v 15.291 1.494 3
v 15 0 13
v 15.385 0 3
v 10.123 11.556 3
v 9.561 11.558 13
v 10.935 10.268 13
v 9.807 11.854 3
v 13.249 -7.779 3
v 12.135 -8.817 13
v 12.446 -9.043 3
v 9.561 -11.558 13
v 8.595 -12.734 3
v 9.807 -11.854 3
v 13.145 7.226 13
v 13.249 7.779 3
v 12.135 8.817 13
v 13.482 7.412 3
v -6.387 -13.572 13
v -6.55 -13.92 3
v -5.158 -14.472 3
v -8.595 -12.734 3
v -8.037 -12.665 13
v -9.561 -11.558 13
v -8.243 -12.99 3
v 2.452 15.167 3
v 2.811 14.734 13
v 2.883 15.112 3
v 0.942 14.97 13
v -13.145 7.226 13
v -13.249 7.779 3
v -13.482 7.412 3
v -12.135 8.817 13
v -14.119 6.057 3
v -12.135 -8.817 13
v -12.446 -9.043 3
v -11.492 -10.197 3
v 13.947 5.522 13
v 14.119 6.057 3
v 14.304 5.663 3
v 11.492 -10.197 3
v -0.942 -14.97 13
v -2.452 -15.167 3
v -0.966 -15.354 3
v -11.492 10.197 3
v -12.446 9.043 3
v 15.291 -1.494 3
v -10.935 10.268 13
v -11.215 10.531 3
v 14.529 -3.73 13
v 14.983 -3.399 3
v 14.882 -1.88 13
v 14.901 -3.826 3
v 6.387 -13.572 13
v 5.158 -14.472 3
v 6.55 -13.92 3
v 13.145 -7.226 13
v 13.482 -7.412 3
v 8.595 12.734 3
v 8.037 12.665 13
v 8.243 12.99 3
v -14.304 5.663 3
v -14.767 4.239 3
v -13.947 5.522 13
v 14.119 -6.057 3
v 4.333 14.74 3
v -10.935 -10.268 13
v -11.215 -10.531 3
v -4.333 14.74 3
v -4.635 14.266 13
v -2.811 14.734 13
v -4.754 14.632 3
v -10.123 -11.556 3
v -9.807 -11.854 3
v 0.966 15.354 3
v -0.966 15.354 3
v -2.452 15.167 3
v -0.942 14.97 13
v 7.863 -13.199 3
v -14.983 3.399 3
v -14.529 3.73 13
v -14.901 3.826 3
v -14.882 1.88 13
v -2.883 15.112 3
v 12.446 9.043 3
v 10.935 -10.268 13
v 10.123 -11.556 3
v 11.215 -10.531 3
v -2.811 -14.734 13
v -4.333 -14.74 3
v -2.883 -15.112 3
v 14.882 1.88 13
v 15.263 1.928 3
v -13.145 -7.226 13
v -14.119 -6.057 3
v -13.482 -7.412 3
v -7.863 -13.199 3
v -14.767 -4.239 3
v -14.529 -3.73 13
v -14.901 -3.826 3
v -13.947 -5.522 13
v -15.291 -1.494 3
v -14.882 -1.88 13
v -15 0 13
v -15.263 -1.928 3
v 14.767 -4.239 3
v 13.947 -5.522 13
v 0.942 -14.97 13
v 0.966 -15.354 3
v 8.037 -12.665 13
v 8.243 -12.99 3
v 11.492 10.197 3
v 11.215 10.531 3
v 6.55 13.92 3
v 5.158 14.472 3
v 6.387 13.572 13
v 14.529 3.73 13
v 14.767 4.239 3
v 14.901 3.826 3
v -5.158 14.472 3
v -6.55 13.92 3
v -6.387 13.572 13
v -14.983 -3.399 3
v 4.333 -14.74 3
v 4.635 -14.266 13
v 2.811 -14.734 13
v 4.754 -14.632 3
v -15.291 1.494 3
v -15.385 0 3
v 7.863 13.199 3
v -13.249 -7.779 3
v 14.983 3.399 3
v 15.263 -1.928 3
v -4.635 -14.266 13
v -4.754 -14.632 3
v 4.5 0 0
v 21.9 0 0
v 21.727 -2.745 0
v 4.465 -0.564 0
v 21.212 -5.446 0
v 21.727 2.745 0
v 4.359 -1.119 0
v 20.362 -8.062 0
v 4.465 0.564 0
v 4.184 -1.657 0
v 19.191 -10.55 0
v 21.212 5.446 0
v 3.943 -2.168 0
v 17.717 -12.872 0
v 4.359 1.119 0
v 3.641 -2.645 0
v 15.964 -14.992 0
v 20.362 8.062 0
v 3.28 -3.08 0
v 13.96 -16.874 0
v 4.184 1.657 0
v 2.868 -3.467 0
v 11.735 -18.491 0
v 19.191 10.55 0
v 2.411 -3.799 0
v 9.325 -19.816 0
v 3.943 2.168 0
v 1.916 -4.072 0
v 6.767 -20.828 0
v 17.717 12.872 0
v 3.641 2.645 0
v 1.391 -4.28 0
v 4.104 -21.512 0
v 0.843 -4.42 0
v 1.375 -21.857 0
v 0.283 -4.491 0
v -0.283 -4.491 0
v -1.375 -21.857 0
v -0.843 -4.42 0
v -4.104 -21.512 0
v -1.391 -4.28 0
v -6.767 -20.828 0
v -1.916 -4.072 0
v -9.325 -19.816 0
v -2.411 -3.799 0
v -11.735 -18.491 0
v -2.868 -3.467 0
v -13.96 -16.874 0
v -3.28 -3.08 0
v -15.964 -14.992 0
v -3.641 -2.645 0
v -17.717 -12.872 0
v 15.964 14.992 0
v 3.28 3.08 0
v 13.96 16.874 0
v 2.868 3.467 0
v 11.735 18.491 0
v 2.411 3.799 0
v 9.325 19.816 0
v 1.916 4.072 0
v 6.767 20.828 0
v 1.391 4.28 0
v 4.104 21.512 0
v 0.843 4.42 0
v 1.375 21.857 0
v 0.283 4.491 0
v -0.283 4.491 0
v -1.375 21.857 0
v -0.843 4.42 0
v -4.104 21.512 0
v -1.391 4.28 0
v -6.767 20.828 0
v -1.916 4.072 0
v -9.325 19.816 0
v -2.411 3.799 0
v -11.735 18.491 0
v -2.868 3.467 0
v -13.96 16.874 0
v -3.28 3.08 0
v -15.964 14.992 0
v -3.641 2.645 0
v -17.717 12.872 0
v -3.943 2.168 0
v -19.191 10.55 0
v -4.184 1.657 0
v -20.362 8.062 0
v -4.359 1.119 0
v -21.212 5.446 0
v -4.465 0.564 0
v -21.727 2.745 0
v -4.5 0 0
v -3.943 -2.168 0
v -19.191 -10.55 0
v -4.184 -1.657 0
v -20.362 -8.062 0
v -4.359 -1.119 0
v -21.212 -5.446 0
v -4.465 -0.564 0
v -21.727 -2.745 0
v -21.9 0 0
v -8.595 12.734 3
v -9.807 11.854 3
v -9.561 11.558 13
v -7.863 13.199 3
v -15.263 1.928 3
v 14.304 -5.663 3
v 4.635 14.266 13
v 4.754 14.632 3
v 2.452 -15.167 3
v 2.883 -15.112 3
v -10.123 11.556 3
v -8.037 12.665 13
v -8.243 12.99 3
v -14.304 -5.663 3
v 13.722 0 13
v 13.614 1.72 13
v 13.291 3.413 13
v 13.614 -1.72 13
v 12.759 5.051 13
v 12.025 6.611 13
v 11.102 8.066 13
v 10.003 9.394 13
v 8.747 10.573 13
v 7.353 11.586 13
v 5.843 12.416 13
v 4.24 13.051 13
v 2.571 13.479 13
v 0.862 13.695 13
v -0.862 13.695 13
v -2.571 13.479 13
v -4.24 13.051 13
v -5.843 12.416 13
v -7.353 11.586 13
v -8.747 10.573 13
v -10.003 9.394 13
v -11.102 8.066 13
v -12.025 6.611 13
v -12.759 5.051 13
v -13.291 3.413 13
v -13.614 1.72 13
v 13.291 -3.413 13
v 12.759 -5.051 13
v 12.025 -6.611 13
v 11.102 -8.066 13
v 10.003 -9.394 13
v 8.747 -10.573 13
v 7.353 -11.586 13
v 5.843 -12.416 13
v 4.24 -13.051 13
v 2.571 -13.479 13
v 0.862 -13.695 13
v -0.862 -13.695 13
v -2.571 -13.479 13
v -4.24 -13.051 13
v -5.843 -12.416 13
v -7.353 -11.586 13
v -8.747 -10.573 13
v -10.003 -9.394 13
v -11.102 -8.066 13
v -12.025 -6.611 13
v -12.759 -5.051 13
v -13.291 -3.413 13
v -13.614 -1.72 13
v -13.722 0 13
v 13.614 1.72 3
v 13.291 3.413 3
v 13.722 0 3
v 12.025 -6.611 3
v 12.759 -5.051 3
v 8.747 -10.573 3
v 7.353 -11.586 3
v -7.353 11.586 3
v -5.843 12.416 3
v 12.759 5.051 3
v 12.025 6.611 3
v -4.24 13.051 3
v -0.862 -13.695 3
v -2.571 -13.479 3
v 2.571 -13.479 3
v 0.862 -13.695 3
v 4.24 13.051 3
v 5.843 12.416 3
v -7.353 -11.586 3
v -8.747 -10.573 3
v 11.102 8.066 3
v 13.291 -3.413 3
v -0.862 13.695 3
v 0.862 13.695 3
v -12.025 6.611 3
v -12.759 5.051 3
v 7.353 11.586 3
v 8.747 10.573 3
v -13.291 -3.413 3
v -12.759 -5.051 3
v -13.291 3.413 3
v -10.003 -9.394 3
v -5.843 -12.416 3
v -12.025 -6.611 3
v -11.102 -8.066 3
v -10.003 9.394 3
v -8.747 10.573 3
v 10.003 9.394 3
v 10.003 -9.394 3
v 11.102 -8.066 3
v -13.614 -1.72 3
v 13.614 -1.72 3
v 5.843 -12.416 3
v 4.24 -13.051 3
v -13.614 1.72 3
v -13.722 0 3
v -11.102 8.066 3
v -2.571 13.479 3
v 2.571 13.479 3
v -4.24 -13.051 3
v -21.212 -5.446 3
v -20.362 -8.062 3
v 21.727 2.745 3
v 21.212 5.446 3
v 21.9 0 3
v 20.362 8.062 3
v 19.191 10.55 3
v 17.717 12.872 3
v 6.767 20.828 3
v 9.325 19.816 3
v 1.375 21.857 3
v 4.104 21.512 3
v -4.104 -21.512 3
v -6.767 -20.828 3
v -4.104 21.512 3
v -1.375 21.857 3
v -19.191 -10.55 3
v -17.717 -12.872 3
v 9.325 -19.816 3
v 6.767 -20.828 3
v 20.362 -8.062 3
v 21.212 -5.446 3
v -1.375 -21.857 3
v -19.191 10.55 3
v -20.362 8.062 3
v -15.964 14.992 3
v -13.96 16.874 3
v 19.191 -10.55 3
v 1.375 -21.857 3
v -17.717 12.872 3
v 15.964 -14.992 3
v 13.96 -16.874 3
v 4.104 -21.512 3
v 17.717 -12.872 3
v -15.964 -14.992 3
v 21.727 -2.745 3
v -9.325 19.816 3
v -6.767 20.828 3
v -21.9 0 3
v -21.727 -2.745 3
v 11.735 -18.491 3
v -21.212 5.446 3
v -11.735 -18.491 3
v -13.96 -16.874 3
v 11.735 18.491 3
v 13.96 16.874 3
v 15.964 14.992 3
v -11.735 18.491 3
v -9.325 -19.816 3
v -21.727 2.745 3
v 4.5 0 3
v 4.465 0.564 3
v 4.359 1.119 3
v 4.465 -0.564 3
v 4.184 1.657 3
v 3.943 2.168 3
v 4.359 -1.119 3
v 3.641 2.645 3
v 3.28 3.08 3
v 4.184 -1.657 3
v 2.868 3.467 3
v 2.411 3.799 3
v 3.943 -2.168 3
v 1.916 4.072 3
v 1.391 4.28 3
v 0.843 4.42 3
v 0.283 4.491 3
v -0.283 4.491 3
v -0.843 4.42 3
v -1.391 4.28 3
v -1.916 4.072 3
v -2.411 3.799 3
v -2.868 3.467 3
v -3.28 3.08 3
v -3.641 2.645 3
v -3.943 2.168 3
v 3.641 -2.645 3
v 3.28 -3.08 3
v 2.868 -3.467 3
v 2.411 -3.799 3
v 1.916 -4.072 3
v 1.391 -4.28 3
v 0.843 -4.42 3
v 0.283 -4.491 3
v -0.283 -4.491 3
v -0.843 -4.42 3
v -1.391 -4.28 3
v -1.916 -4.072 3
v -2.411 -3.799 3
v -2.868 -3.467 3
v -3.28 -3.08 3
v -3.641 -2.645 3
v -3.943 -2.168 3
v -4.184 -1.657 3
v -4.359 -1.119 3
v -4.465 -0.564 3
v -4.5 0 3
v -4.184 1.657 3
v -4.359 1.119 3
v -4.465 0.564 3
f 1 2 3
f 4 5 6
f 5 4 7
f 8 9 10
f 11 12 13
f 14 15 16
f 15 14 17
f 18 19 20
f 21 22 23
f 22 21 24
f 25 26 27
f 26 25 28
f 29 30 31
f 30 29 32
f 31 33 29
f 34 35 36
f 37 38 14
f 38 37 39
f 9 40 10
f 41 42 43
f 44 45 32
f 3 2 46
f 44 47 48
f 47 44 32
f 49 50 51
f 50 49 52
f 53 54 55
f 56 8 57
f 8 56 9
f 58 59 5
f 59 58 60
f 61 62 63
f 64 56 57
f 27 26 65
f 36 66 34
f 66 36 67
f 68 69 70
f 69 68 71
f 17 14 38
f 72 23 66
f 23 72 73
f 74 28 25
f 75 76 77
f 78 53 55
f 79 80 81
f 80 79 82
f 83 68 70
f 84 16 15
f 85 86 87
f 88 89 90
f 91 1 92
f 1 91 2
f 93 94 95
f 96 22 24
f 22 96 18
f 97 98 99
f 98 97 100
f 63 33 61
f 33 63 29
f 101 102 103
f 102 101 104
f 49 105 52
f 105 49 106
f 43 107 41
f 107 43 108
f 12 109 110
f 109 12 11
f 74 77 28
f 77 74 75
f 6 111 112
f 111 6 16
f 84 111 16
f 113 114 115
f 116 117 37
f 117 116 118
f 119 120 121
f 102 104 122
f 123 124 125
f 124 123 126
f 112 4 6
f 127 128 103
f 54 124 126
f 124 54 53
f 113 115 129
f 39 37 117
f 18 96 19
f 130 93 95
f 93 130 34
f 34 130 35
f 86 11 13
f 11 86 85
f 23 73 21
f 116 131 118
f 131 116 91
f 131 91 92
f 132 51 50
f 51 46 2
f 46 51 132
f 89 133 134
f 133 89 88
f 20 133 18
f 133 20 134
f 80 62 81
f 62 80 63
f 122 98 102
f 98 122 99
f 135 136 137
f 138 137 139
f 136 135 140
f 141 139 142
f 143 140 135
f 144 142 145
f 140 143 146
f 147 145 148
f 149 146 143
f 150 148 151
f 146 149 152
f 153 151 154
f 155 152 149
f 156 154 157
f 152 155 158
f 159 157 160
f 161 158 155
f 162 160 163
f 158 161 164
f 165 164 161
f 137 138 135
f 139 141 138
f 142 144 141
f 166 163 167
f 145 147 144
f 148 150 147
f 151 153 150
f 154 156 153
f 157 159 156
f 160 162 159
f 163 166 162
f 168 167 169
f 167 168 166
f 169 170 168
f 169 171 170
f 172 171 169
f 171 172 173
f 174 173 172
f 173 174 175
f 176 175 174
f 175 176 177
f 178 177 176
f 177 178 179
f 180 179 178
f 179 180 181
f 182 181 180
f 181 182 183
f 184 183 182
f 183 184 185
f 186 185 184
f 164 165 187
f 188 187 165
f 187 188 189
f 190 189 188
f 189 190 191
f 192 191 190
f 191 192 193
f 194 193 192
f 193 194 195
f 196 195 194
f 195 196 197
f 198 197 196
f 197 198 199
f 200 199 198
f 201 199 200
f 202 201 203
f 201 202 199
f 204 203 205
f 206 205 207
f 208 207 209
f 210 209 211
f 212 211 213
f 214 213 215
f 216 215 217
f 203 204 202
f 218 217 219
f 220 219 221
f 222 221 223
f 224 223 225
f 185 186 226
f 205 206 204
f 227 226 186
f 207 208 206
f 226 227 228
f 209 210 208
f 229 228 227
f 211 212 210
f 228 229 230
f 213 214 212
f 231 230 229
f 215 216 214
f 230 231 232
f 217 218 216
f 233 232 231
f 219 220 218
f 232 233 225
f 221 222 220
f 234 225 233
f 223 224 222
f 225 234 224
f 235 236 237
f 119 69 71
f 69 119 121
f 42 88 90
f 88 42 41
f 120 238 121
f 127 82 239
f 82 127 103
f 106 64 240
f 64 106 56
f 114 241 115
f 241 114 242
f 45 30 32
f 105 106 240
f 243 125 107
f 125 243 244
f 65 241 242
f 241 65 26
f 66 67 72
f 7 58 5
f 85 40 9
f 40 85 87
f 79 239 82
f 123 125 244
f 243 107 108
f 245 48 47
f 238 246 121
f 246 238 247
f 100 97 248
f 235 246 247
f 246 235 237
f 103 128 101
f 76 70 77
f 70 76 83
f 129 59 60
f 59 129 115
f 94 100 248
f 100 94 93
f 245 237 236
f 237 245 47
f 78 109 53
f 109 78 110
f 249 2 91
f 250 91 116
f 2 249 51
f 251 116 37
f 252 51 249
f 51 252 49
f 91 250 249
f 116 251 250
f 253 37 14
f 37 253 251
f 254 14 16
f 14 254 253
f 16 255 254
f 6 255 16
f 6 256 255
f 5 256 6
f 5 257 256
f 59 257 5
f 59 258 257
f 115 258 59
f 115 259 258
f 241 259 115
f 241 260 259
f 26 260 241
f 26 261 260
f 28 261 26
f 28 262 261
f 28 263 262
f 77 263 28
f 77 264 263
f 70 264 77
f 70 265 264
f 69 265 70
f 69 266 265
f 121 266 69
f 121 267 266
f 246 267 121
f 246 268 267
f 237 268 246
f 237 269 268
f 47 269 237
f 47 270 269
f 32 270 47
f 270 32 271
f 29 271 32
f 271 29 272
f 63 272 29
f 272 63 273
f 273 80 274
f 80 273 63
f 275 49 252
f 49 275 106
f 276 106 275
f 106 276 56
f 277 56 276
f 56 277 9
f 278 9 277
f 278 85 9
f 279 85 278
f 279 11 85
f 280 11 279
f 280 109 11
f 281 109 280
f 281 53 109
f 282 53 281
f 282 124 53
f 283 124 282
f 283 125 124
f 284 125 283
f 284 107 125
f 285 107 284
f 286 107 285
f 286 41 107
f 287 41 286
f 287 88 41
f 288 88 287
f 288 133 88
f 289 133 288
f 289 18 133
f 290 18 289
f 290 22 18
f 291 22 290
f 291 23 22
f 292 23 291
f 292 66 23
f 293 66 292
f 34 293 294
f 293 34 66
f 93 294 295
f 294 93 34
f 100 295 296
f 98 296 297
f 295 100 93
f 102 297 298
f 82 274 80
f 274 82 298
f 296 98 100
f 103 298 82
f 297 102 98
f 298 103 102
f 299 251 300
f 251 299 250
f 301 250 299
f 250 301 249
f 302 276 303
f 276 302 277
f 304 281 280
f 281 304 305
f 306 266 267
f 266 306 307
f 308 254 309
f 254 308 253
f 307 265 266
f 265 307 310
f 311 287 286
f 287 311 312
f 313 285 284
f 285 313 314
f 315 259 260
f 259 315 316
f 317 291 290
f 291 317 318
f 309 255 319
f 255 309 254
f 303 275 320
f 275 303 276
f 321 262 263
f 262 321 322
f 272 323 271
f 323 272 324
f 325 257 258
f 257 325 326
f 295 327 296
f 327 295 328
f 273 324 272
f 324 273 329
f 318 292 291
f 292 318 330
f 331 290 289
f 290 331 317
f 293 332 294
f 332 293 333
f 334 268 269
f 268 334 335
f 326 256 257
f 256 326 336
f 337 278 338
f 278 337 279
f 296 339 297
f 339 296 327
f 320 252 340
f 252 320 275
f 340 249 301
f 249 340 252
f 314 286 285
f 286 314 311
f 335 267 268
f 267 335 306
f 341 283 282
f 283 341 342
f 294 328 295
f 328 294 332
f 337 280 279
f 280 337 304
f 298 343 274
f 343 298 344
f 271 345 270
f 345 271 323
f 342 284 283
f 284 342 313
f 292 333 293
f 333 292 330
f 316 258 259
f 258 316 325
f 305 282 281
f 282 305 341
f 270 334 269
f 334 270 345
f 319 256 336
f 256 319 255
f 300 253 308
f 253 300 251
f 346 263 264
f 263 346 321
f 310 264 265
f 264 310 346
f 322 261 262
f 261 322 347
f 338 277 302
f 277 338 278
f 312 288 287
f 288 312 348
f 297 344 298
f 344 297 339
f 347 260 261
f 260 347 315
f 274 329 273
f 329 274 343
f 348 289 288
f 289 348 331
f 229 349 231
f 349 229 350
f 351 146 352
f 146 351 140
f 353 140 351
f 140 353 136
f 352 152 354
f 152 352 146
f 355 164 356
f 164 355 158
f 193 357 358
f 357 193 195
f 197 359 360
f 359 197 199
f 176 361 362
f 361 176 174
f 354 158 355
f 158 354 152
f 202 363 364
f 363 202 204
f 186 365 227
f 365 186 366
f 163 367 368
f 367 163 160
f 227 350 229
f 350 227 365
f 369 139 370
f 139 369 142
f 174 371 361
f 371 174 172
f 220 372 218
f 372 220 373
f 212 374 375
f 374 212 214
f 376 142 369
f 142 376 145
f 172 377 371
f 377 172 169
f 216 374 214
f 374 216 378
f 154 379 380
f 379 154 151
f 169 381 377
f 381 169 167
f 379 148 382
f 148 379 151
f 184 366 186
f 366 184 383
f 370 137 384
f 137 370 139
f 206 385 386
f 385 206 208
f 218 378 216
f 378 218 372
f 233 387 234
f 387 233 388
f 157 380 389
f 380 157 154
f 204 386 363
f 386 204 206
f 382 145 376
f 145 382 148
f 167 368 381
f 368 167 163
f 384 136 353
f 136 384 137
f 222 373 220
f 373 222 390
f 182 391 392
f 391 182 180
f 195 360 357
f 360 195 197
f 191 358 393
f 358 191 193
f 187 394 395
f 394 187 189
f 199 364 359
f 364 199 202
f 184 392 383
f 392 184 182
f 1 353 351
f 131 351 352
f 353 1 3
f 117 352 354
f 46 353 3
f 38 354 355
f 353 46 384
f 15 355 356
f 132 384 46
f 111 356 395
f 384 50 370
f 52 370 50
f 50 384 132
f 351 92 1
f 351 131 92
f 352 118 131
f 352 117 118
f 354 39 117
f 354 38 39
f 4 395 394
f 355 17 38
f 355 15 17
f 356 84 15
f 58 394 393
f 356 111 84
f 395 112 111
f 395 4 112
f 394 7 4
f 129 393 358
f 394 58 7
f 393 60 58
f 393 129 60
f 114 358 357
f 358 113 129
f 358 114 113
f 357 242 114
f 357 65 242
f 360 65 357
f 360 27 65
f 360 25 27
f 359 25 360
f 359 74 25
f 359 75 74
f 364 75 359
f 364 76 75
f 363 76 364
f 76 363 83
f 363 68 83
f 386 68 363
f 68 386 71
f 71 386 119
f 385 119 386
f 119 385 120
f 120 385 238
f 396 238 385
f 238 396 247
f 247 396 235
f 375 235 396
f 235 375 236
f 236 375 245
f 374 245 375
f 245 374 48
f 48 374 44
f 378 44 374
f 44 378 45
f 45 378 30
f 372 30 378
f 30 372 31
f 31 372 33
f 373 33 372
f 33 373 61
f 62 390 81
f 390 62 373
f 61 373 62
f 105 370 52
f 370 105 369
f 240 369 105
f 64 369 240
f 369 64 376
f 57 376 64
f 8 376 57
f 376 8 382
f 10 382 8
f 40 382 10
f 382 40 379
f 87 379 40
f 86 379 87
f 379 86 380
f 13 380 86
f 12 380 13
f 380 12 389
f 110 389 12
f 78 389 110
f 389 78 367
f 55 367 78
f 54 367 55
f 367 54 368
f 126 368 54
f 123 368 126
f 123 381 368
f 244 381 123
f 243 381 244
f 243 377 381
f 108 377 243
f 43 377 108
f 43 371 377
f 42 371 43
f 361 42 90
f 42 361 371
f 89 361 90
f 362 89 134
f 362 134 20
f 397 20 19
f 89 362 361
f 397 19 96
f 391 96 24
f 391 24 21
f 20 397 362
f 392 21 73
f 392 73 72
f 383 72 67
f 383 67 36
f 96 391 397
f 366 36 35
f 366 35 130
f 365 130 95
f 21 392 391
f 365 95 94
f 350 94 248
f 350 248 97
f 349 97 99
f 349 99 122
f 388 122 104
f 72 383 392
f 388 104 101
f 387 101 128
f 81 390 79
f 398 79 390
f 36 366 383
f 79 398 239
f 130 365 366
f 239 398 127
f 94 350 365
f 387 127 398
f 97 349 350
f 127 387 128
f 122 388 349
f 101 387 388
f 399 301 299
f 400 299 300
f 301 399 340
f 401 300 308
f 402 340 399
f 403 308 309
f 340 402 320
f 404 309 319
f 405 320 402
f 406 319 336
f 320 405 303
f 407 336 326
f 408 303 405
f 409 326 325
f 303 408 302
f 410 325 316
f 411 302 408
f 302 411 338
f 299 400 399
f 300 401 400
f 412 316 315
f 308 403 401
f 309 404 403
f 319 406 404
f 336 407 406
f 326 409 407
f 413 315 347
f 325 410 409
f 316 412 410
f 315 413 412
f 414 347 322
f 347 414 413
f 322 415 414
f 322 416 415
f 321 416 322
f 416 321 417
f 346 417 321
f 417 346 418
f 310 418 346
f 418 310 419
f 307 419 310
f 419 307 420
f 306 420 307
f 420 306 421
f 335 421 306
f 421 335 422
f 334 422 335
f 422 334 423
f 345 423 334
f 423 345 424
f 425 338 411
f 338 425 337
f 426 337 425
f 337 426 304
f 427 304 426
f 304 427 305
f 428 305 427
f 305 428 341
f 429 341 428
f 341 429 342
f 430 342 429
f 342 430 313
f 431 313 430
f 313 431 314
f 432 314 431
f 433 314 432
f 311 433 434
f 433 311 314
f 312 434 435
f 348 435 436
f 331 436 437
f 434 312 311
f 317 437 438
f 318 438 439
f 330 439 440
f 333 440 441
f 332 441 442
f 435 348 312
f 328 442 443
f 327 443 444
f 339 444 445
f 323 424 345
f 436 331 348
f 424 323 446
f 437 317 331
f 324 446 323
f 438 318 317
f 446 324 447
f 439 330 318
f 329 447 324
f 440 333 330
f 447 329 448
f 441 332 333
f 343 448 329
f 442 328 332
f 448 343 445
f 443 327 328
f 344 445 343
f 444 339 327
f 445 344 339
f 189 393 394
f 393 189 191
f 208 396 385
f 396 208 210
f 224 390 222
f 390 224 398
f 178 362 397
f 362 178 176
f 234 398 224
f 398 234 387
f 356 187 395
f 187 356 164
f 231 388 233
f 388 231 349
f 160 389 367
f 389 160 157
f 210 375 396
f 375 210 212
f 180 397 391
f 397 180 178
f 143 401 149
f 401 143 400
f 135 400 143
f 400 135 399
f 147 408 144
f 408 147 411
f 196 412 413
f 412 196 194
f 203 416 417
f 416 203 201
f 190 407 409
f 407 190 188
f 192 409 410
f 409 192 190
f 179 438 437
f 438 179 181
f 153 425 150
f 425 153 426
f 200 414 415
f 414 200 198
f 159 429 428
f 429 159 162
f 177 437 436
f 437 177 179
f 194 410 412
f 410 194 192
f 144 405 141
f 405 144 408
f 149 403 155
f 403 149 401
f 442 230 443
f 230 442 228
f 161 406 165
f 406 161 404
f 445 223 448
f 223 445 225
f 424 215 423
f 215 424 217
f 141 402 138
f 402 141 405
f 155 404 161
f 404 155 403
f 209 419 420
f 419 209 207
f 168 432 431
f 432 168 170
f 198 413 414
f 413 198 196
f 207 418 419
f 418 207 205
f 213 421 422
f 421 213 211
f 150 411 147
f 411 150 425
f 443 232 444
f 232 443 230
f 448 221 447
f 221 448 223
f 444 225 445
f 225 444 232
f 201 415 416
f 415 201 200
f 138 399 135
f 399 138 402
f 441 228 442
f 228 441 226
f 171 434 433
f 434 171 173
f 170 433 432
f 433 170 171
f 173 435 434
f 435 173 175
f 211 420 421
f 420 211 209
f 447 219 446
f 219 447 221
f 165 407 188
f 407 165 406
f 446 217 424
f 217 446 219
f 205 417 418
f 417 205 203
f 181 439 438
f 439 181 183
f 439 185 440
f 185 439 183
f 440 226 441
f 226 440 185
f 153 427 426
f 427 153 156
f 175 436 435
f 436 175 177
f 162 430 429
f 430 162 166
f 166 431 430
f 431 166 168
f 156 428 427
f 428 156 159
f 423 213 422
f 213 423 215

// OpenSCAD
// Parametric filament spool bushing 
// http://www.thingiverse.com/thing:288144
// Design by Kyle Randall "3D-ME"
//1-20-15; fixed bug on Customizer app to let users select the number of bushings made, thanks esquehill for catching that!

// Adjust the following parameters:
spool_hole=32;//set this to equal your spool's hole size
rod_hole=8;//set this to the size of the rod that you are using as an axis for the spool
retainer_height=13;//you can add a number here//height of the inner cylinder
resolution=50;//resolution of the model
lip_height=3;//thickness of the outer lip
bushings=1; //[1,2]
//number of bushings to render (one or two)
// If you wish for any more customizable parameters, ask on the coments here: http://www.thingiverse.com/thing:288144/#comments
////////Don't edit the following unless you know what you're doing/////////
module bushing(){//this is our bushing 
	difference(){
		union(){
			difference(){	
				cylinder(r1=spool_hole/2-0.5,r2=spool_hole/2-1,h=retainer_height,$fn=resolution);
				cylinder(r=spool_hole/2-spool_hole/18-0.5,h=retainer_height,$fn=resolution);}
			cylinder(r=spool_hole/2+spool_hole/5-0.5,h=lip_height,$fn=resolution);
		}
		cylinder(r=rod_hole/2+0.5,h=lip_height+2,$fn=resolution);
	}
}
module two(){//this is a bushing placed to the right of the other one
	translate([spool_hole*1.5,0,0]){
		bushing();
	}
}
bushing();//calling the first bushing 
if (bushings==2) two();//and the second if true
